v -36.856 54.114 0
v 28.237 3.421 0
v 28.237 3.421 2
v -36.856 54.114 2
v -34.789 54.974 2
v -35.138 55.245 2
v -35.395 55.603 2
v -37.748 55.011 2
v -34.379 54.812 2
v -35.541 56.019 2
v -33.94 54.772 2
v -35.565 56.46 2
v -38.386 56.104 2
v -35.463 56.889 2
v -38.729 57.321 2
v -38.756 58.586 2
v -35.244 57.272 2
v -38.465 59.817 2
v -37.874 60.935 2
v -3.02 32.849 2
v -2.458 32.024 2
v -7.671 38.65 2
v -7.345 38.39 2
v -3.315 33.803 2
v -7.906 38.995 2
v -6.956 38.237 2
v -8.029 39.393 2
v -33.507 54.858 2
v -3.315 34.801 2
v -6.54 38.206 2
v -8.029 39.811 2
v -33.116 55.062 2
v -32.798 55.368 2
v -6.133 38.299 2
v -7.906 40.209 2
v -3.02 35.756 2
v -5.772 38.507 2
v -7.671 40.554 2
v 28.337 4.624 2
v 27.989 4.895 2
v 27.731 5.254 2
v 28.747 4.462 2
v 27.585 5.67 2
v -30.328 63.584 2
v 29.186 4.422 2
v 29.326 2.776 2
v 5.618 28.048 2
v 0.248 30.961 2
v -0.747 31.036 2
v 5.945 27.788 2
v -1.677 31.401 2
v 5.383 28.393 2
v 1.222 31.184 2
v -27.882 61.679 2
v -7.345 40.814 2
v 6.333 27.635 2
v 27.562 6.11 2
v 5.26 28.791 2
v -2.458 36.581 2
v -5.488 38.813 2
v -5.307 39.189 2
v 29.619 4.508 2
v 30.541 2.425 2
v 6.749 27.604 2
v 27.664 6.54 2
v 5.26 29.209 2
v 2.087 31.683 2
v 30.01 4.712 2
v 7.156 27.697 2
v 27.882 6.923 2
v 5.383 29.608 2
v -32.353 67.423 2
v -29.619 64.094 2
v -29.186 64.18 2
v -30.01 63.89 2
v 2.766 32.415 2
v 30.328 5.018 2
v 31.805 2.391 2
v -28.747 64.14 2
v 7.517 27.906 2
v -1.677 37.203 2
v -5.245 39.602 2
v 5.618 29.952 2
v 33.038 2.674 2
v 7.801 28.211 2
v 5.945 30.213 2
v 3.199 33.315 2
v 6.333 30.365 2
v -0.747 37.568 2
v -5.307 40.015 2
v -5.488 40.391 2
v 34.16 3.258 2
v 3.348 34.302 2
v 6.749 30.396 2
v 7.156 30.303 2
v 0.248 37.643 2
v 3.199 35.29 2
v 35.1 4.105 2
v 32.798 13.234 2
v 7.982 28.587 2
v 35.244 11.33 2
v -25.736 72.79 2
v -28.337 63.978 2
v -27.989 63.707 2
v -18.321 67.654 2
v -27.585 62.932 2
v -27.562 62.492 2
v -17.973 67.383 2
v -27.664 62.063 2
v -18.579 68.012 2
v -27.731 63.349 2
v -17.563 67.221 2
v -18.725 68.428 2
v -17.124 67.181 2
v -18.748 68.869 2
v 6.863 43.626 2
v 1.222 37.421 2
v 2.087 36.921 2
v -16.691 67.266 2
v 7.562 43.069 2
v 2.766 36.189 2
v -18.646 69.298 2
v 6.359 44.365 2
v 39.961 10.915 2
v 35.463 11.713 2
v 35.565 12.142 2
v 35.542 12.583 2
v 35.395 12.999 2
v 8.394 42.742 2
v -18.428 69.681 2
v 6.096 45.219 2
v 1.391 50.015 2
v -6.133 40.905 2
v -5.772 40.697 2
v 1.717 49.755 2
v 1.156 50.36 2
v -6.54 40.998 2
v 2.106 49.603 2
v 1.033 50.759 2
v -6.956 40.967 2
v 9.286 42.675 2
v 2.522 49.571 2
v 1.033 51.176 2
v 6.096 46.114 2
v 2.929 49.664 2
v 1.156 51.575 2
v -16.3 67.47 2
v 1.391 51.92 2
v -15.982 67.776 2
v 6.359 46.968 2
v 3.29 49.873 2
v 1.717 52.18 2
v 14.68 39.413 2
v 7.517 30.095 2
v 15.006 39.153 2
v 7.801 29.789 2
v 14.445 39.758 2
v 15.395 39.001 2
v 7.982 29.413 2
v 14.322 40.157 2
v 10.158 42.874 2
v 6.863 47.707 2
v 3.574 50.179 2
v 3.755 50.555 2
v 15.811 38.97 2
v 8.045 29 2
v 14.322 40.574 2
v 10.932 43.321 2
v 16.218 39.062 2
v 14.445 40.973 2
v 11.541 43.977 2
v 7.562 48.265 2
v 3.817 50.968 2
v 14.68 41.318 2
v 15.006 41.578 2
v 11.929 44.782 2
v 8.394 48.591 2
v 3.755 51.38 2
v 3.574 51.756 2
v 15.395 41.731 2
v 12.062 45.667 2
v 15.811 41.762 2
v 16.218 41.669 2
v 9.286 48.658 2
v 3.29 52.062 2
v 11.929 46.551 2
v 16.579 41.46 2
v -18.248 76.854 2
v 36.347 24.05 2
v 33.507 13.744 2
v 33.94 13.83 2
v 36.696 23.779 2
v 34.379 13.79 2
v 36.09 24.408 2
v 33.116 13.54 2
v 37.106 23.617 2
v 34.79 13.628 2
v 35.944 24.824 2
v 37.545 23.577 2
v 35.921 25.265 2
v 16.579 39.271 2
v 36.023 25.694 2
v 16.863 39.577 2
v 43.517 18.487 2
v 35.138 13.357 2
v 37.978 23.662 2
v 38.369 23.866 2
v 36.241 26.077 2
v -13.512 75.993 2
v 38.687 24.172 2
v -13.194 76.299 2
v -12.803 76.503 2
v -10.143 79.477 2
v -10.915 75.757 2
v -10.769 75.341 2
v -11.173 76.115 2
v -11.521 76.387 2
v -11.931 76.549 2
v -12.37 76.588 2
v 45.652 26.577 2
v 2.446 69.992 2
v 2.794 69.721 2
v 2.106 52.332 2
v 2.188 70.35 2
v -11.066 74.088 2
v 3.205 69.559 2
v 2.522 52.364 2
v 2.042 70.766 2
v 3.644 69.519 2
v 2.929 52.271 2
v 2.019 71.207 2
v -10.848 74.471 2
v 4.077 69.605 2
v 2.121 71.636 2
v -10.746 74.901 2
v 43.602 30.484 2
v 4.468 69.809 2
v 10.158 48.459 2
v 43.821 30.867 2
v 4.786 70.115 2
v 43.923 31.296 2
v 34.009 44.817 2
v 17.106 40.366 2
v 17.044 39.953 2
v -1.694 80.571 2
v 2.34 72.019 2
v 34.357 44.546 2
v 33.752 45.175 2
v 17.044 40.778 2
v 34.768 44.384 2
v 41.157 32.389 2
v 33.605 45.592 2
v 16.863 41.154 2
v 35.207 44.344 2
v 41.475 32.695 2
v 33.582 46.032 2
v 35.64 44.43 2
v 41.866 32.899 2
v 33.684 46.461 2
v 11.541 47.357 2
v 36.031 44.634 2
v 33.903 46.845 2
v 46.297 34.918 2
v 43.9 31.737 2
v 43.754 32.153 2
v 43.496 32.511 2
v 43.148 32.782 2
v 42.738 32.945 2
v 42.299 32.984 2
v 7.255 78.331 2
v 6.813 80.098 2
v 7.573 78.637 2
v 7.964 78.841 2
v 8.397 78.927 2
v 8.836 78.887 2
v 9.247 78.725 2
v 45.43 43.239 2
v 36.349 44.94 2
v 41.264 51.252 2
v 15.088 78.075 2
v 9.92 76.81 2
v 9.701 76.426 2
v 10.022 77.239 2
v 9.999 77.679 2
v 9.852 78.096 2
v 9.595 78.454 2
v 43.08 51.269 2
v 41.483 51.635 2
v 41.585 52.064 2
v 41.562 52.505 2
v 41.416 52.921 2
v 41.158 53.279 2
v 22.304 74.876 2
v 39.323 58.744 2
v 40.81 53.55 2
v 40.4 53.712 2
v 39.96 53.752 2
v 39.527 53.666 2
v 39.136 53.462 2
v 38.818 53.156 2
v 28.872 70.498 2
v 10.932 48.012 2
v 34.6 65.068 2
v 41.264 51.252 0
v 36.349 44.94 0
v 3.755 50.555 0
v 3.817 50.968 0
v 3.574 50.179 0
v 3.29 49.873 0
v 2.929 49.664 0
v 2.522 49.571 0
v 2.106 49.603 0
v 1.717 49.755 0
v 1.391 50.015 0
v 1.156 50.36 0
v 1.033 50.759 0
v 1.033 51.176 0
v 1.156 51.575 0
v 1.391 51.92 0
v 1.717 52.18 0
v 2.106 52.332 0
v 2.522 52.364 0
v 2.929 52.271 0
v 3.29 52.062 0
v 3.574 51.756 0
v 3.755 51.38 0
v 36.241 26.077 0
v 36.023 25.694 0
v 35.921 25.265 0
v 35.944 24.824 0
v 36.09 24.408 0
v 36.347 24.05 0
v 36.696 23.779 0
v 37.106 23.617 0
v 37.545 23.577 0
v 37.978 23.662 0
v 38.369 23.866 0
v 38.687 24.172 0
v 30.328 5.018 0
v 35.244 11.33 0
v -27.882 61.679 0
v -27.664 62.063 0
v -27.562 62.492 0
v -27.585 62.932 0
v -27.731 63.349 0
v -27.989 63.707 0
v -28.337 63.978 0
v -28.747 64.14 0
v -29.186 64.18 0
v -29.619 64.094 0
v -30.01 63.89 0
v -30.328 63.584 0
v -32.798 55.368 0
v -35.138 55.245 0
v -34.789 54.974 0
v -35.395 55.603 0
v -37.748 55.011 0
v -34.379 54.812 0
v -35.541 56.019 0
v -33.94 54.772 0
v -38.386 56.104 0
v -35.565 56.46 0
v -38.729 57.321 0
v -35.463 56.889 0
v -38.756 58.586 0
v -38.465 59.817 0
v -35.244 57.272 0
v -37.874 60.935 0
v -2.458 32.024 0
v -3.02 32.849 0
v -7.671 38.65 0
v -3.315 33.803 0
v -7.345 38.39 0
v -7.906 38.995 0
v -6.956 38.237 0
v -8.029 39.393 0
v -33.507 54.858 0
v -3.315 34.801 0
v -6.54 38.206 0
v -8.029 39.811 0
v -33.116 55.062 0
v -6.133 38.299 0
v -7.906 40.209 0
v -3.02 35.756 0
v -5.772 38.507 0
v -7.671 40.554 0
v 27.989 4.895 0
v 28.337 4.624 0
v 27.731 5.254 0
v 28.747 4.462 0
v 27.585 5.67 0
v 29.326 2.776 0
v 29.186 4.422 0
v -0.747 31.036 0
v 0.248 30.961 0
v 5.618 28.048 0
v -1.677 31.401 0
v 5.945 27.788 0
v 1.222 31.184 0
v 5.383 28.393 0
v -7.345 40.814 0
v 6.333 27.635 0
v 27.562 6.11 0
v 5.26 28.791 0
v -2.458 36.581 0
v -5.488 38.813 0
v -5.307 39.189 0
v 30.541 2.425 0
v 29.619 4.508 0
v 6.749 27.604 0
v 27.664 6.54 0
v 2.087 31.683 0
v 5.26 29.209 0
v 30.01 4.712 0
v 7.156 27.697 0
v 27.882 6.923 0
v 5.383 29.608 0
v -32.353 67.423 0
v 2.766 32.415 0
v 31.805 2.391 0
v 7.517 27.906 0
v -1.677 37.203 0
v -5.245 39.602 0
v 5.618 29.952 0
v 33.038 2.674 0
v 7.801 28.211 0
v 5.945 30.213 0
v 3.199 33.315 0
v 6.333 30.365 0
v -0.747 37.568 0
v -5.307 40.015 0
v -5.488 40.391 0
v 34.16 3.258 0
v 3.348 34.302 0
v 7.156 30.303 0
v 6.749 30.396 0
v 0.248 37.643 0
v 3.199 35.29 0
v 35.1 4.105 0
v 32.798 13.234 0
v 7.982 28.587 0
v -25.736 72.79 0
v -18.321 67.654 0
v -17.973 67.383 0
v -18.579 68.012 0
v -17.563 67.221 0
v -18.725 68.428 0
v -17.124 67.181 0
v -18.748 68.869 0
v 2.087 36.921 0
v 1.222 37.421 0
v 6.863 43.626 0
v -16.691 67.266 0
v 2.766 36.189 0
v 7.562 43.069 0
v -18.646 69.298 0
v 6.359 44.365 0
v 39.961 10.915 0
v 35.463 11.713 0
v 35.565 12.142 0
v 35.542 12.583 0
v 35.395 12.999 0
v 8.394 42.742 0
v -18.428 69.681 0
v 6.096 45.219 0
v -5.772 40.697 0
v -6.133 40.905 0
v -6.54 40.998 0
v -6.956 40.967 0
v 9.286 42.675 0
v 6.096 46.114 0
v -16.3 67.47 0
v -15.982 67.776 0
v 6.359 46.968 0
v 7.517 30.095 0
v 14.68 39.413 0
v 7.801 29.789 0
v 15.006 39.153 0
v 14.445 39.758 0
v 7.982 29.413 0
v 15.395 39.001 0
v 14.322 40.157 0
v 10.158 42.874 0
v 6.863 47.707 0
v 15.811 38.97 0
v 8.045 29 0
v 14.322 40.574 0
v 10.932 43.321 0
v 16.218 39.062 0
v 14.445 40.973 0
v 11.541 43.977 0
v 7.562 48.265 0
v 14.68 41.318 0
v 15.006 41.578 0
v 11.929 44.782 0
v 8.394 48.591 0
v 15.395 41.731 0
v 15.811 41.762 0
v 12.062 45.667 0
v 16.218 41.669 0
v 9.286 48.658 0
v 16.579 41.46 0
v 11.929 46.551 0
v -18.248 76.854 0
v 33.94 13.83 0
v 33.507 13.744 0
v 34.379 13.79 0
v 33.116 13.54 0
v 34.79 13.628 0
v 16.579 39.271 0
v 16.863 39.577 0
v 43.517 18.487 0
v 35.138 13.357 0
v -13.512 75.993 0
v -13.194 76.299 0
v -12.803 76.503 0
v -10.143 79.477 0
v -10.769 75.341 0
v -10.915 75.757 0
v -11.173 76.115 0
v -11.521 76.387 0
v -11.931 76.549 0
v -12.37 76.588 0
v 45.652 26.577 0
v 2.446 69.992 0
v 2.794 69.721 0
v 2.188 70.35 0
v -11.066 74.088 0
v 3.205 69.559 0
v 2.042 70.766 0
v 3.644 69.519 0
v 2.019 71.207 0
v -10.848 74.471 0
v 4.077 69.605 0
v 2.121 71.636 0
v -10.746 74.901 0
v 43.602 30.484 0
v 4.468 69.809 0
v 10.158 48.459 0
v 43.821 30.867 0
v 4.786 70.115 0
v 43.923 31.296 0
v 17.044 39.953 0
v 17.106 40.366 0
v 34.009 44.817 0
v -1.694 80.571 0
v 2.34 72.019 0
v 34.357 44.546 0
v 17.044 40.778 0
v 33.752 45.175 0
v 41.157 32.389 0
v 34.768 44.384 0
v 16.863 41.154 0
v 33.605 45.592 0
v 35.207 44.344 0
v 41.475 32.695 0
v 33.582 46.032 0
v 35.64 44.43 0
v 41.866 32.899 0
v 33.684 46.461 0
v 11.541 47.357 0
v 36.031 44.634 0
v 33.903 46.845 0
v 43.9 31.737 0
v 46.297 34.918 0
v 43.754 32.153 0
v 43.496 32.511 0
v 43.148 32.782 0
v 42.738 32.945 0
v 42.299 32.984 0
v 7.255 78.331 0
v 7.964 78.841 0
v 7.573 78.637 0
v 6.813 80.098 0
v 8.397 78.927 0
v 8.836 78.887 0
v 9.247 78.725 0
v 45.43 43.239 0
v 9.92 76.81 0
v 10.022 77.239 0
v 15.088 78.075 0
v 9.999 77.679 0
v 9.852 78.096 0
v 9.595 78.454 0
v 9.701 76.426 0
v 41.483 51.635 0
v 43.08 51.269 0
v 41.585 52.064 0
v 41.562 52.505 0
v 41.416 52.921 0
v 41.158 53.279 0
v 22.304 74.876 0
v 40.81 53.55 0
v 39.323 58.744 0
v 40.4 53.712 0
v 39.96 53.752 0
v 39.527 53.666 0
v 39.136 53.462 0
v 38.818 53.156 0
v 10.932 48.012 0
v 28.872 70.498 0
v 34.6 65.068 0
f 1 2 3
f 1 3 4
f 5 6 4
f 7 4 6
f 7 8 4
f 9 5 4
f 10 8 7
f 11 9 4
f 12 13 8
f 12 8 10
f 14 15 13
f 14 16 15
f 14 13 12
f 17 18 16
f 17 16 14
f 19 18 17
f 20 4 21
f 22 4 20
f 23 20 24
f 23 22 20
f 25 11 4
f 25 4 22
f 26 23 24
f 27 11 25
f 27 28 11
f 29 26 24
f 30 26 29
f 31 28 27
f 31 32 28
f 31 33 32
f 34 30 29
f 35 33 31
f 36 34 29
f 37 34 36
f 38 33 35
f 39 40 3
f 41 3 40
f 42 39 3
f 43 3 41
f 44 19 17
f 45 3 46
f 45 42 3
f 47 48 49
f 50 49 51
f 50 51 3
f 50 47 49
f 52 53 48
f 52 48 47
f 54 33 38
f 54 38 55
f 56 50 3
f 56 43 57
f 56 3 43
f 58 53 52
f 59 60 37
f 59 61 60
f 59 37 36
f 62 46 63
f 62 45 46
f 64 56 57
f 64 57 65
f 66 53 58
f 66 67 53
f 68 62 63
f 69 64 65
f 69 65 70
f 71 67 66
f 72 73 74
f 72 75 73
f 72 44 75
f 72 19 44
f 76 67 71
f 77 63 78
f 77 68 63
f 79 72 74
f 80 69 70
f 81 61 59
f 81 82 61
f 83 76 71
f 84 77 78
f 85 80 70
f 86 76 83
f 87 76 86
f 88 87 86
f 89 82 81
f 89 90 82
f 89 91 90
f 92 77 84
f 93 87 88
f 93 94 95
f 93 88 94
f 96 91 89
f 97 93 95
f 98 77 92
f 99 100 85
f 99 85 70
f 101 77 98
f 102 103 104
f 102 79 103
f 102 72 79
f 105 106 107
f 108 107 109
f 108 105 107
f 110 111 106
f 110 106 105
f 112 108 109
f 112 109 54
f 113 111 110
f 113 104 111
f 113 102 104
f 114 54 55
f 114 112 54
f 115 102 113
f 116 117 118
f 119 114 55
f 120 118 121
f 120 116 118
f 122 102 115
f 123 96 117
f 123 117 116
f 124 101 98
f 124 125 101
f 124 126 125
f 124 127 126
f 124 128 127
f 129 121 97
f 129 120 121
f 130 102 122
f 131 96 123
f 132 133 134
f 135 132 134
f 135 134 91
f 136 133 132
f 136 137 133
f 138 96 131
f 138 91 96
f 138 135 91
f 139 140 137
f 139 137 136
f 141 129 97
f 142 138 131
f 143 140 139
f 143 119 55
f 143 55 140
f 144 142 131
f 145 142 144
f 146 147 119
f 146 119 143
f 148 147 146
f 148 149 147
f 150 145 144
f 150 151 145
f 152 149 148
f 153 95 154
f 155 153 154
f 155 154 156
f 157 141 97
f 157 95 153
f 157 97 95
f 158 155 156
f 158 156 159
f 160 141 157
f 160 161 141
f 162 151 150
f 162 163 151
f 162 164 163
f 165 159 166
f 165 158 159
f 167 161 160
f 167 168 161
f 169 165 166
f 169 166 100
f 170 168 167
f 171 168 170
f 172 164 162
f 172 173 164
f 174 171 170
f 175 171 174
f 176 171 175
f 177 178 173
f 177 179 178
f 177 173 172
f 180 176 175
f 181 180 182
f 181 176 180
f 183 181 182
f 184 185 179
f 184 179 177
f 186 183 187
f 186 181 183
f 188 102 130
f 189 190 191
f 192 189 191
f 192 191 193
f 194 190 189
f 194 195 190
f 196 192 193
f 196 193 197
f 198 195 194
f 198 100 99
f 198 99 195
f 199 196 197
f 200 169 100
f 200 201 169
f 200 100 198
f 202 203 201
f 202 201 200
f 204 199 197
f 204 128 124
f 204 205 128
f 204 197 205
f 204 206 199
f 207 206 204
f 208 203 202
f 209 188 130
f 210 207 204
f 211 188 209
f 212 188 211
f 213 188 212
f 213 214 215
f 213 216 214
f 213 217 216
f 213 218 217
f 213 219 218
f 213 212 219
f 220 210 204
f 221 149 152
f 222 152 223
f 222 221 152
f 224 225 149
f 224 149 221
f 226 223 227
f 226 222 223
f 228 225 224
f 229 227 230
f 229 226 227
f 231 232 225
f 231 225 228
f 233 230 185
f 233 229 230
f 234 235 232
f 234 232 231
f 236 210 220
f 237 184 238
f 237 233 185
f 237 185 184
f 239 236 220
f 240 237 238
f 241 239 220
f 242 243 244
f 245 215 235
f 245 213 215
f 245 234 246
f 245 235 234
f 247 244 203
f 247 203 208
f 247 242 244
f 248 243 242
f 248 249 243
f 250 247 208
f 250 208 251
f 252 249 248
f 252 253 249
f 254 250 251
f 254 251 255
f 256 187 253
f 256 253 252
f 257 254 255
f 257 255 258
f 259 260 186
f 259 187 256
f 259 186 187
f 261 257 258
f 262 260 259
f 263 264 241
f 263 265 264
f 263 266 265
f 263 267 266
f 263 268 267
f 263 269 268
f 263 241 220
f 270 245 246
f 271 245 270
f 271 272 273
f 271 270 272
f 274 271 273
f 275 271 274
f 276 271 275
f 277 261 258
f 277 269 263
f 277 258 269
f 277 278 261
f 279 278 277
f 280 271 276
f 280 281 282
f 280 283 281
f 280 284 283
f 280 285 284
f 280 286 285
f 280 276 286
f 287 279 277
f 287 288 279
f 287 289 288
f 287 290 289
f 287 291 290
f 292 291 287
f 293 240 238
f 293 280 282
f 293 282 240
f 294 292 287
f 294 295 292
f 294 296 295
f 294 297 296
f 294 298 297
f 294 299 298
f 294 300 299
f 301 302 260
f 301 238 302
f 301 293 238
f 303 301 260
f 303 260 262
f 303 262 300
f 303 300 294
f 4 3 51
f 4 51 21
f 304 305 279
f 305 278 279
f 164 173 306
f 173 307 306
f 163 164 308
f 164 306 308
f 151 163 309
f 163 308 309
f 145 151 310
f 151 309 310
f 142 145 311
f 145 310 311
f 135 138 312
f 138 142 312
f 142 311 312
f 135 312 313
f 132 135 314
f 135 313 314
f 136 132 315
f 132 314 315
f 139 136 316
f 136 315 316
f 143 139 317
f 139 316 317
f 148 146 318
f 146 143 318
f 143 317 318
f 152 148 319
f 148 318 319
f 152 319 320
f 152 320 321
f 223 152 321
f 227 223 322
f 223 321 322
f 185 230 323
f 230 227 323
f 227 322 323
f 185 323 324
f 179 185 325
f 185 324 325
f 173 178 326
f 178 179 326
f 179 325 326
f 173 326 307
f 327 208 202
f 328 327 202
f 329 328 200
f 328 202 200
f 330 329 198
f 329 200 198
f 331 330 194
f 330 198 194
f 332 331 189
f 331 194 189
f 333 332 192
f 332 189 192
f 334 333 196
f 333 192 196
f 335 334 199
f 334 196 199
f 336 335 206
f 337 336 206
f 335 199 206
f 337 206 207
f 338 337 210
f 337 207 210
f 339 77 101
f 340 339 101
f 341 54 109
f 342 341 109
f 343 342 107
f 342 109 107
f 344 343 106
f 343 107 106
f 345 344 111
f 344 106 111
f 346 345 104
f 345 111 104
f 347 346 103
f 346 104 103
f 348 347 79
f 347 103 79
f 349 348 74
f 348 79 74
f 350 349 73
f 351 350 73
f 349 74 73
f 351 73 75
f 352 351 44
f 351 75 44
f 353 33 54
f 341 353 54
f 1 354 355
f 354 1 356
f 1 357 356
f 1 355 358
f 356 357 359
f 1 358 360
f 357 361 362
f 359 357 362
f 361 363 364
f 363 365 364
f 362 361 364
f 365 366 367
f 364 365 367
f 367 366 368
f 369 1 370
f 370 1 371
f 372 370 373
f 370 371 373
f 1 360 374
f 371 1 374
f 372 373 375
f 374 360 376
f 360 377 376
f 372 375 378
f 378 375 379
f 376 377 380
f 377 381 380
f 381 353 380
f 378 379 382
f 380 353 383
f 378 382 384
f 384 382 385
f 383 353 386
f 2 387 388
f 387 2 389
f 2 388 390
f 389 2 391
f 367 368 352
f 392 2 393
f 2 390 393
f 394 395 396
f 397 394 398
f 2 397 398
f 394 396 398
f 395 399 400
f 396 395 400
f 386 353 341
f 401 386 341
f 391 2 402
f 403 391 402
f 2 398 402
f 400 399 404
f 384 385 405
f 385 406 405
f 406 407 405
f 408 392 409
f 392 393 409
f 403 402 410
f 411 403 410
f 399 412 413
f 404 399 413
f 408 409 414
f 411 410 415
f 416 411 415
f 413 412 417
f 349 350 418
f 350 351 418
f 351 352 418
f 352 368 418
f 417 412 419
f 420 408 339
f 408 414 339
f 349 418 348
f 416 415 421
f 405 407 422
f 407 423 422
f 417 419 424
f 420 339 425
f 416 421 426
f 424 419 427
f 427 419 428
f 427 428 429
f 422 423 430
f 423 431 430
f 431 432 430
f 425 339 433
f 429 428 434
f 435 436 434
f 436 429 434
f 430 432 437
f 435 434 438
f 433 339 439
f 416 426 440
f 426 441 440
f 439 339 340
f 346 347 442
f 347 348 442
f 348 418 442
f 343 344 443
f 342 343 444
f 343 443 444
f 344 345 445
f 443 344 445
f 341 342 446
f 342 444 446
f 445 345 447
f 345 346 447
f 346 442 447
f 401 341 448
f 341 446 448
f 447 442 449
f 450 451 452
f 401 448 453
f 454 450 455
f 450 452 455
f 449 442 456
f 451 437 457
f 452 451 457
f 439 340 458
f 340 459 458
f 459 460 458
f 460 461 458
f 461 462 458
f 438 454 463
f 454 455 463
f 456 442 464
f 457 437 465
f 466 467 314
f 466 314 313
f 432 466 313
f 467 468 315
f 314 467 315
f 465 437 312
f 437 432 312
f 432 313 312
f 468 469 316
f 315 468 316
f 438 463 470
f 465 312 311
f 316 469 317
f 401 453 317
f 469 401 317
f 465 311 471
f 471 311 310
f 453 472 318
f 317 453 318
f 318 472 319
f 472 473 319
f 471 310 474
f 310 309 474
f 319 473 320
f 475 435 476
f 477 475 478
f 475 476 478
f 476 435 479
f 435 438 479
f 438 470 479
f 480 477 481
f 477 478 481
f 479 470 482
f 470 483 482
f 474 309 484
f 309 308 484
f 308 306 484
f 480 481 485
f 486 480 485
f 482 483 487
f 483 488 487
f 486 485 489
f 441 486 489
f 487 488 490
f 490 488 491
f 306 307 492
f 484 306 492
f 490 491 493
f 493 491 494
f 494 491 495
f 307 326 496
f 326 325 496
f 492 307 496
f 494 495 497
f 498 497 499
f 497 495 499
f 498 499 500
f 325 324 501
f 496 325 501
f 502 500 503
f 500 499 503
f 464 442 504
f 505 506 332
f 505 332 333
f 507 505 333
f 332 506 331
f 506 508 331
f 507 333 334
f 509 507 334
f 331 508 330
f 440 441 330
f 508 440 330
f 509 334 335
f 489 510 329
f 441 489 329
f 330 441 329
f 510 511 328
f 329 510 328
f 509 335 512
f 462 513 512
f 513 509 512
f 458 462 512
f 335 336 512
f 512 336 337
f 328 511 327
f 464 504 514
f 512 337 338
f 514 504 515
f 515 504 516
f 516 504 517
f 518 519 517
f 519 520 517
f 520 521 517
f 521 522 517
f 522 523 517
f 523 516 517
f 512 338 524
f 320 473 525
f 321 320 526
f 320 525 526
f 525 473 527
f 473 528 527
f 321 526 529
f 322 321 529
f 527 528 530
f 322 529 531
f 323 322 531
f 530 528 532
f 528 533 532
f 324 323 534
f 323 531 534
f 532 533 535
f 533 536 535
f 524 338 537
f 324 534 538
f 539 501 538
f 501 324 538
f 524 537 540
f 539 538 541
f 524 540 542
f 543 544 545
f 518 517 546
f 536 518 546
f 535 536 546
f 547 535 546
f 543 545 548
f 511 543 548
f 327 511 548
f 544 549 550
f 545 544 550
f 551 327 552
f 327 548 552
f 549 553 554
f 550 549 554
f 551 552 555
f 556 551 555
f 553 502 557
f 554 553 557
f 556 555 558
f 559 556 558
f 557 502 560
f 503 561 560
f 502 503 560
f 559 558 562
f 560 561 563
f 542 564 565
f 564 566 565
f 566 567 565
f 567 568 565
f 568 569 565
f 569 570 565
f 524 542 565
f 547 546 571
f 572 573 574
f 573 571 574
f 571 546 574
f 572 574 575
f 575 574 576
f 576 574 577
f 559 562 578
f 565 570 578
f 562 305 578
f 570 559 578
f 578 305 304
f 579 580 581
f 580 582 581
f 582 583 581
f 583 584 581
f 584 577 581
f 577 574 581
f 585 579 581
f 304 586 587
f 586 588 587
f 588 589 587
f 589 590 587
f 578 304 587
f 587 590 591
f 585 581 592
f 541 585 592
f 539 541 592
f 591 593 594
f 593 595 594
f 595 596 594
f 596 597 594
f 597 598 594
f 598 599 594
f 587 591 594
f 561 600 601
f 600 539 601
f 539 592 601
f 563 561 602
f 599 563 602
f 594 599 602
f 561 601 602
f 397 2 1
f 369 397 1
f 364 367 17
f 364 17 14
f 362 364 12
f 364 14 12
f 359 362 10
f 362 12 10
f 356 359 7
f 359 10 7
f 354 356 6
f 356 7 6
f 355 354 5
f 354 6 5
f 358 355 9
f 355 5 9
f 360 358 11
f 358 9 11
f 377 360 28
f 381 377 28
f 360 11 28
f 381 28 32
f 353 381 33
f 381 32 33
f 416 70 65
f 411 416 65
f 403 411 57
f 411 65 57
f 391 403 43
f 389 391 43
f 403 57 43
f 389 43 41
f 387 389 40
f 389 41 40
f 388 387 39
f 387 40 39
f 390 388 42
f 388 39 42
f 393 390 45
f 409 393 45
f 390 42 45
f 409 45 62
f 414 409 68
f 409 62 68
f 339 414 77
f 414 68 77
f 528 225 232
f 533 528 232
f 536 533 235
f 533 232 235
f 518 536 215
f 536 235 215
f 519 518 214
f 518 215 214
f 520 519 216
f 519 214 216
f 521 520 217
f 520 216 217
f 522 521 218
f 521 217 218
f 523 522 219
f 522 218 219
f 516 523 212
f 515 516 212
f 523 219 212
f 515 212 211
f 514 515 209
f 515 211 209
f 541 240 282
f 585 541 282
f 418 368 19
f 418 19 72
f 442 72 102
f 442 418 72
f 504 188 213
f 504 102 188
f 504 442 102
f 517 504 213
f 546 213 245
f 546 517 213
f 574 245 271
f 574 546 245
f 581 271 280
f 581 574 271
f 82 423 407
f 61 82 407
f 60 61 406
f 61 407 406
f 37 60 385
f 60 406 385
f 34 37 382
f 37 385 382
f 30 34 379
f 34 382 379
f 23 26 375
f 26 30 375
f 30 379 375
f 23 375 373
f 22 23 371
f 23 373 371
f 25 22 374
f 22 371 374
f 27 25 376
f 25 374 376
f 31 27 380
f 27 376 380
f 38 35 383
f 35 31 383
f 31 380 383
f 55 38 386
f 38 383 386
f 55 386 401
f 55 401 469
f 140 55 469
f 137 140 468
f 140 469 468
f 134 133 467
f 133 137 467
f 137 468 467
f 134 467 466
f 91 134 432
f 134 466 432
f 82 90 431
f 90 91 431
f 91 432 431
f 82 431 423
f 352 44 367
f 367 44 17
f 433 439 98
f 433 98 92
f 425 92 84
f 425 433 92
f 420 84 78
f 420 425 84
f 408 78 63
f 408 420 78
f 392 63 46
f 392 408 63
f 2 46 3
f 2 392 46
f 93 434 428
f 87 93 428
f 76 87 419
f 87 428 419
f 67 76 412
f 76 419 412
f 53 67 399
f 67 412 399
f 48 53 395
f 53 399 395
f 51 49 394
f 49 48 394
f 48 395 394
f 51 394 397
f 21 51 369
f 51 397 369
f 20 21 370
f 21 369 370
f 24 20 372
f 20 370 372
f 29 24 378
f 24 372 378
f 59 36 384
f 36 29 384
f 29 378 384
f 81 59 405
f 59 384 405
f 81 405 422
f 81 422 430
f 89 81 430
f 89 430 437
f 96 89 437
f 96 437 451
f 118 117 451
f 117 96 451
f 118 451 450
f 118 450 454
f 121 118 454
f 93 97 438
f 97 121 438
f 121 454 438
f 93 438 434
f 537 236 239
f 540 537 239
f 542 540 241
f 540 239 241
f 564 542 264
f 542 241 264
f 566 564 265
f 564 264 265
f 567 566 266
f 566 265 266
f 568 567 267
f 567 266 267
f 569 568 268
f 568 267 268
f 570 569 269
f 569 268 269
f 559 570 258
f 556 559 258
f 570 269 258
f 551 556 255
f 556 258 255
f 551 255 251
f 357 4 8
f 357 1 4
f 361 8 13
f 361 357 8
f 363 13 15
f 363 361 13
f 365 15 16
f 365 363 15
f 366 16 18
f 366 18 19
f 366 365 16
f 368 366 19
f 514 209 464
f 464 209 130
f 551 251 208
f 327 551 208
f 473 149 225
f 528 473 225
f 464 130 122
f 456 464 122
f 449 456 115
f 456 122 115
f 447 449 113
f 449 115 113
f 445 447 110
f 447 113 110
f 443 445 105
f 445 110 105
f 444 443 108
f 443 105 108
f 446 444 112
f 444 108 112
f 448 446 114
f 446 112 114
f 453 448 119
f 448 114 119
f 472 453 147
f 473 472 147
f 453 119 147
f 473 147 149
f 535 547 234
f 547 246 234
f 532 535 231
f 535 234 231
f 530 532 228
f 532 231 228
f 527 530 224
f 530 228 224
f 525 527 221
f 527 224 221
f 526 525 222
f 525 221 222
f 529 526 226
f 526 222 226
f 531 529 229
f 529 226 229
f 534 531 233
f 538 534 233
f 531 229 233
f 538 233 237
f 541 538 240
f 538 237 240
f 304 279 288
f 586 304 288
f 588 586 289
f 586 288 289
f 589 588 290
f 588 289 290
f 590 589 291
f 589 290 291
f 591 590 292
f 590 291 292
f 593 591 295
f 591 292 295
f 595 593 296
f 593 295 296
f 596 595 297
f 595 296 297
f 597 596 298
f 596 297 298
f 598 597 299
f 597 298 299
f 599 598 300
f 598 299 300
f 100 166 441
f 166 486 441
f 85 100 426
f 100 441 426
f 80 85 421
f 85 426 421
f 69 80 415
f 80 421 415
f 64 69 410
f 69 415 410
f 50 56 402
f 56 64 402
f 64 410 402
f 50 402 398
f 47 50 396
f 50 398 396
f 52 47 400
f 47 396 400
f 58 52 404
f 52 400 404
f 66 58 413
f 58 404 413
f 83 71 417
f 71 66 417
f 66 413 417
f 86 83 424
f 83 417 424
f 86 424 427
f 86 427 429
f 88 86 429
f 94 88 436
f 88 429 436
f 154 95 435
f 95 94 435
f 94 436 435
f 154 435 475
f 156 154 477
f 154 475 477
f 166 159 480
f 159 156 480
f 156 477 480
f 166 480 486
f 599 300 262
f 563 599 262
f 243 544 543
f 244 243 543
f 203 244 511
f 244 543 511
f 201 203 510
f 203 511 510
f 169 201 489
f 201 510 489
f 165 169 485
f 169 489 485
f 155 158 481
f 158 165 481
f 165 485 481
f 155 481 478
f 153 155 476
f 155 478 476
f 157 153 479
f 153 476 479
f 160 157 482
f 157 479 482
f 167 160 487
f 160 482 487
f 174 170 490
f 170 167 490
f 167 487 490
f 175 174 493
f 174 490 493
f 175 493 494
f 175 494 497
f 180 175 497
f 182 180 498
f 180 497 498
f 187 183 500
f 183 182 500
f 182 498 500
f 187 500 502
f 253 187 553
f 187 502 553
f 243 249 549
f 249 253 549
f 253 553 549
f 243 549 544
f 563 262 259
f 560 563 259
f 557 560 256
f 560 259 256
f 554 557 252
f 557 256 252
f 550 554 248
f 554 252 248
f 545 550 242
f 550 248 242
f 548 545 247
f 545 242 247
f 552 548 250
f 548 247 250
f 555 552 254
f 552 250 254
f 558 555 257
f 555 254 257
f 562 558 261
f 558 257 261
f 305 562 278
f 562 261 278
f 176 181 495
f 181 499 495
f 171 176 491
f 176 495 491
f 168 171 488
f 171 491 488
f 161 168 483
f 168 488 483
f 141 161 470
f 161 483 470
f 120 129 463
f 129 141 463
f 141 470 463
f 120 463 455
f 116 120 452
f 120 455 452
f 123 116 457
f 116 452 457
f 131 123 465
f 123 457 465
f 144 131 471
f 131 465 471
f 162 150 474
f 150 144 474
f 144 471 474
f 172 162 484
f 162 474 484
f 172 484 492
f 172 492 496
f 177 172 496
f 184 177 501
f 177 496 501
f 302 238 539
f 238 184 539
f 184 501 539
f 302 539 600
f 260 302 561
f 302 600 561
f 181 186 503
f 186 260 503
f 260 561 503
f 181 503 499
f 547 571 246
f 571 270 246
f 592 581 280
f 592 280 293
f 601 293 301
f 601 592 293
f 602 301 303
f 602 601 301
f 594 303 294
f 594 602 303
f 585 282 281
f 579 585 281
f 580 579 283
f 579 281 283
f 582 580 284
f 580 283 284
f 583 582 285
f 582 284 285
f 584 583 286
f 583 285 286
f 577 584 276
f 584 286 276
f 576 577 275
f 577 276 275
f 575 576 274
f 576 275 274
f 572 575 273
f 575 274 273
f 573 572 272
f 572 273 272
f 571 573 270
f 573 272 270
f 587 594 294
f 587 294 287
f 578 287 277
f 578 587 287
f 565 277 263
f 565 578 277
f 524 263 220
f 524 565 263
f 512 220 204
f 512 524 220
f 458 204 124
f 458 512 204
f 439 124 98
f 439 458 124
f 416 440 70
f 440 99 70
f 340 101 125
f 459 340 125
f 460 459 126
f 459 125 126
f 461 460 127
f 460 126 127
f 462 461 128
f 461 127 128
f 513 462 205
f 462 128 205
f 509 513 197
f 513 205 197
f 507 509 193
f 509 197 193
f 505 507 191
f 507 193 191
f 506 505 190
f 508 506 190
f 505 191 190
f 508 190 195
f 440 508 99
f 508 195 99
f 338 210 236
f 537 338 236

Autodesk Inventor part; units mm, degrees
ref_plane "YZ Plane" through (0, 0, 0) normal (1, 0, 0) x (0, 1, 0)
ref_plane "XZ Plane" through (0, 0, 0) normal (0, 1, 0) x (-1, 0, 0)
ref_plane "XY Plane" through (0, 0, 0) normal (0, 0, 1) x (1, 0, 0)
ref_plane "Arbeitsebene1" through (0, 0, 0) normal (0, 0, 1) x (1, 0, 0)
sketch "Skizze1" plane through (0, 0, 0) normal (0, 0, 1) x (1, 0, 0)
  line L0 (39.3233, 58.7442) -> (31.1975, 48.5587) projected
  arc A0 (20.3661, 6.7006) -> (31.1975, 48.5587) centre (0, 34.301) ccw projected
  line L1 (20.3661, 6.7006) -> (24.3422, 1.3125) projected
  arc A1 (24.3422, 1.3125) -> (31.7994, 0.6471) centre (28.3654, 4.2814) ccw projected
  arc A2 (31.7994, 0.6471) -> (39.3233, 58.7442) centre (0, 34.301) ccw projected
  circle A3 centre (37.5836, 49.0481) radius 1.4 projected
  circle A4 centre (39.9219, 28.2806) radius 1.4 projected
  circle A5 centre (31.5631, 9.1262) radius 1.4 projected
  line L2 (6.9617, 67.8882) -> (15.0883, 78.0746) projected
  arc A6 (15.0883, 78.0746) -> (-39.8826, 57.8205) centre (0, 34.301) ccw projected
  arc A7 (-39.8826, 57.8205) -> (-37.5755, 50.698) centre (-35.5757, 55.2807) ccw projected
  line L3 (-37.5755, 50.698) -> (-31.4381, 48.0198) projected
  arc A8 (6.9617, 67.8882) -> (-31.4381, 48.0198) centre (0, 34.301) ccw projected
  circle A9 centre (-31.5631, 59.4759) radius 1.4 projected
  circle A10 centre (-14.7471, 71.8847) radius 1.4 projected
  circle A11 centre (6.0205, 74.2229) radius 1.4 projected
  circle A12 centre (-0.002, 34.3021) radius 3.35 projected
  circle A13 centre (9.062, 45.6666) radius 3 projected
  circle A14 centre (2.4174, 50.9675) radius 1.9 projected
  circle A15 centre (15.7065, 40.3657) radius 1.9 projected
  circle A16 centre (6.6446, 29.0001) radius 1.9 projected
  circle A17 centre (-6.6446, 39.602) radius 1.9 projected
  line L4 (31.7994, 0.6471) -> (-40.3324, 56.8214)
  arc A18 (20.3661, 6.7006) -> (-31.4381, 48.0198) centre (0, 34.301) ccw projected
  arc A19 (31.7994, 0.6471) -> (-39.8826, 57.8205) centre (0, 34.301) ccw projected
  circle A20 centre (15.7065, 40.3657) radius 1.4
  circle A21 centre (6.6446, 29.0001) radius 1.4
  circle A22 centre (-6.6446, 39.602) radius 1.4
  circle A23 centre (2.4174, 50.9675) radius 1.4
  point P0 (0, 0)
  dimension "d2" = 2.8
  dimension "d3" = 2.8
  dimension "d4" = 2.8
  dimension "d5" = 2.8
extrude "Extrusion1" add sketch "Skizze1" along normal blind 2 contours A2 L4 A0 L0 | L0 A18 L2 A19 | A0 L4 A8 A18 | L2 A8 L4 A7 A6 | A14 | A15 | A16 | A17
sketch "Skizze2" plane through (0, 0, 2) normal (0, 0, 1) x (1, 0, 0)
  arc A0 (31.7994, 0.6471) -> (-39.8826, 57.8205) centre (0, 34.301) ccw projected
  arc A1 (-39.8826, 57.8205) -> (-40.3324, 56.8214) centre (-35.5757, 55.2807) ccw projected
  line L0 (-40.3324, 56.8214) -> (31.7994, 0.6471) projected
  circle A2 centre (31.5631, 9.1262) radius 1.4 projected
  circle A3 centre (39.9219, 28.2806) radius 1.4 projected
  circle A4 centre (37.5836, 49.0481) radius 1.4 projected
  circle A5 centre (-31.5631, 59.4759) radius 1.4 projected
  circle A6 centre (-14.7471, 71.8847) radius 1.4 projected
  circle A7 centre (6.0205, 74.2229) radius 1.4 projected
  circle A8 centre (9.062, 45.6666) radius 3 projected
  circle A9 centre (-0.002, 34.3021) radius 3.35 projected
  circle A10 centre (15.7065, 40.3657) radius 1.4 projected
  circle A11 centre (2.4174, 50.9675) radius 1.4 projected
  circle A12 centre (-6.6446, 39.602) radius 1.4 projected
  circle A13 centre (6.6446, 29.0001) radius 1.4 projected
  line L1 (29.1054, 5.9703) -> (34.0209, 12.2821) construction
  circle A14 centre (31.5631, 9.1262) radius 1.4 projected
  line L2 (30.3283, 5.018) -> (35.2438, 11.3297)
  line L3 (32.798, 13.2345) -> (27.8825, 6.9227)
  arc A15 (27.8825, 6.9227) -> (30.3283, 5.018) centre (29.1054, 5.9703) ccw
  arc A16 (35.2438, 11.3297) -> (32.798, 13.2345) centre (34.0209, 12.2821) ccw
  line L4 (37.4642, 25.1247) -> (42.3796, 31.4365) construction
  line L5 (38.6871, 24.1723) -> (43.6025, 30.4841)
  line L6 (41.1567, 32.3888) -> (36.2413, 26.0771)
  arc A17 (36.2413, 26.0771) -> (38.6871, 24.1723) centre (37.4642, 25.1247) ccw
  arc A18 (43.6025, 30.4841) -> (41.1567, 32.3888) centre (42.3796, 31.4365) ccw
  line L7 (35.1259, 45.8922) -> (40.0413, 52.204) construction
  line L8 (36.3488, 44.9399) -> (41.2642, 51.2516)
  line L9 (38.8184, 53.1564) -> (33.903, 46.8446)
  arc A19 (33.903, 46.8446) -> (36.3488, 44.9399) centre (35.1259, 45.8922) ccw
  arc A20 (41.2642, 51.2516) -> (38.8184, 53.1564) centre (40.0413, 52.204) ccw
  line L10 (3.5627, 71.0671) -> (8.4782, 77.3788) construction
  line L11 (4.7857, 70.1147) -> (9.7011, 76.4265)
  line L12 (7.2553, 78.3312) -> (2.3398, 72.0194)
  arc A21 (2.3398, 72.0194) -> (4.7857, 70.1147) centre (3.5627, 71.0671) ccw
  arc A22 (9.7011, 76.4265) -> (7.2553, 78.3312) centre (8.4782, 77.3788) ccw
  line L13 (-17.2048, 68.7288) -> (-12.2894, 75.0405) construction
  line L14 (-15.9819, 67.7764) -> (-11.0664, 74.0882)
  line L15 (-13.5123, 75.9929) -> (-18.4277, 69.6811)
  arc A23 (-18.4277, 69.6811) -> (-15.9819, 67.7764) centre (-17.2048, 68.7288) ccw
  arc A24 (-11.0664, 74.0882) -> (-13.5123, 75.9929) centre (-12.2894, 75.0405) ccw
  line L16 (-34.0209, 56.32) -> (-29.1054, 62.6318) construction
  line L17 (-32.798, 55.3676) -> (-27.8825, 61.6794)
  line L18 (-30.3283, 63.5841) -> (-35.2438, 57.2723)
  arc A25 (-35.2438, 57.2723) -> (-32.798, 55.3676) centre (-34.0209, 56.32) ccw
  arc A26 (-27.8825, 61.6794) -> (-30.3283, 63.5841) centre (-29.1054, 62.6318) ccw
  line L19 (29.1054, 5.9703) -> (34.0209, 12.2821) construction
  line L20 (30.3283, 5.018) -> (35.2438, 11.3297)
  line L21 (32.798, 13.2345) -> (27.8825, 6.9227)
  arc A27 (27.8825, 6.9227) -> (30.3283, 5.018) centre (29.1054, 5.9703) ccw
  arc A28 (35.2438, 11.3297) -> (32.798, 13.2345) centre (34.0209, 12.2821) ccw
  point P0 (0, 0)
  dimension "d6" = 4
  dimension "d7" = 3.1
  dimension "d8" = 3.1
  dimension "d9" = 3.1
  dimension "d10" = 3.1
  dimension "d11" = 3.1
  dimension "d12" = 3.1
  dimension "d13" = 3.1
extrude "Extrusion2" cut sketch "Skizze2" against normal blind 2 contours A7 | A15 L3 A16 L2 | A17 L6 A18 L5 | A19 L9 A20 L8 | A21 L12 A22 L11 | A23 L15 A24 L14 | A25 L18 A26 L17
fillet "Rundung1" radius 5 2 edges at (-40.3324, 56.8214, 1) (31.7994, 0.6471, 1)
properties part number "Anglerfish_Lightplate_Tosslink_adjuster_flipped"
